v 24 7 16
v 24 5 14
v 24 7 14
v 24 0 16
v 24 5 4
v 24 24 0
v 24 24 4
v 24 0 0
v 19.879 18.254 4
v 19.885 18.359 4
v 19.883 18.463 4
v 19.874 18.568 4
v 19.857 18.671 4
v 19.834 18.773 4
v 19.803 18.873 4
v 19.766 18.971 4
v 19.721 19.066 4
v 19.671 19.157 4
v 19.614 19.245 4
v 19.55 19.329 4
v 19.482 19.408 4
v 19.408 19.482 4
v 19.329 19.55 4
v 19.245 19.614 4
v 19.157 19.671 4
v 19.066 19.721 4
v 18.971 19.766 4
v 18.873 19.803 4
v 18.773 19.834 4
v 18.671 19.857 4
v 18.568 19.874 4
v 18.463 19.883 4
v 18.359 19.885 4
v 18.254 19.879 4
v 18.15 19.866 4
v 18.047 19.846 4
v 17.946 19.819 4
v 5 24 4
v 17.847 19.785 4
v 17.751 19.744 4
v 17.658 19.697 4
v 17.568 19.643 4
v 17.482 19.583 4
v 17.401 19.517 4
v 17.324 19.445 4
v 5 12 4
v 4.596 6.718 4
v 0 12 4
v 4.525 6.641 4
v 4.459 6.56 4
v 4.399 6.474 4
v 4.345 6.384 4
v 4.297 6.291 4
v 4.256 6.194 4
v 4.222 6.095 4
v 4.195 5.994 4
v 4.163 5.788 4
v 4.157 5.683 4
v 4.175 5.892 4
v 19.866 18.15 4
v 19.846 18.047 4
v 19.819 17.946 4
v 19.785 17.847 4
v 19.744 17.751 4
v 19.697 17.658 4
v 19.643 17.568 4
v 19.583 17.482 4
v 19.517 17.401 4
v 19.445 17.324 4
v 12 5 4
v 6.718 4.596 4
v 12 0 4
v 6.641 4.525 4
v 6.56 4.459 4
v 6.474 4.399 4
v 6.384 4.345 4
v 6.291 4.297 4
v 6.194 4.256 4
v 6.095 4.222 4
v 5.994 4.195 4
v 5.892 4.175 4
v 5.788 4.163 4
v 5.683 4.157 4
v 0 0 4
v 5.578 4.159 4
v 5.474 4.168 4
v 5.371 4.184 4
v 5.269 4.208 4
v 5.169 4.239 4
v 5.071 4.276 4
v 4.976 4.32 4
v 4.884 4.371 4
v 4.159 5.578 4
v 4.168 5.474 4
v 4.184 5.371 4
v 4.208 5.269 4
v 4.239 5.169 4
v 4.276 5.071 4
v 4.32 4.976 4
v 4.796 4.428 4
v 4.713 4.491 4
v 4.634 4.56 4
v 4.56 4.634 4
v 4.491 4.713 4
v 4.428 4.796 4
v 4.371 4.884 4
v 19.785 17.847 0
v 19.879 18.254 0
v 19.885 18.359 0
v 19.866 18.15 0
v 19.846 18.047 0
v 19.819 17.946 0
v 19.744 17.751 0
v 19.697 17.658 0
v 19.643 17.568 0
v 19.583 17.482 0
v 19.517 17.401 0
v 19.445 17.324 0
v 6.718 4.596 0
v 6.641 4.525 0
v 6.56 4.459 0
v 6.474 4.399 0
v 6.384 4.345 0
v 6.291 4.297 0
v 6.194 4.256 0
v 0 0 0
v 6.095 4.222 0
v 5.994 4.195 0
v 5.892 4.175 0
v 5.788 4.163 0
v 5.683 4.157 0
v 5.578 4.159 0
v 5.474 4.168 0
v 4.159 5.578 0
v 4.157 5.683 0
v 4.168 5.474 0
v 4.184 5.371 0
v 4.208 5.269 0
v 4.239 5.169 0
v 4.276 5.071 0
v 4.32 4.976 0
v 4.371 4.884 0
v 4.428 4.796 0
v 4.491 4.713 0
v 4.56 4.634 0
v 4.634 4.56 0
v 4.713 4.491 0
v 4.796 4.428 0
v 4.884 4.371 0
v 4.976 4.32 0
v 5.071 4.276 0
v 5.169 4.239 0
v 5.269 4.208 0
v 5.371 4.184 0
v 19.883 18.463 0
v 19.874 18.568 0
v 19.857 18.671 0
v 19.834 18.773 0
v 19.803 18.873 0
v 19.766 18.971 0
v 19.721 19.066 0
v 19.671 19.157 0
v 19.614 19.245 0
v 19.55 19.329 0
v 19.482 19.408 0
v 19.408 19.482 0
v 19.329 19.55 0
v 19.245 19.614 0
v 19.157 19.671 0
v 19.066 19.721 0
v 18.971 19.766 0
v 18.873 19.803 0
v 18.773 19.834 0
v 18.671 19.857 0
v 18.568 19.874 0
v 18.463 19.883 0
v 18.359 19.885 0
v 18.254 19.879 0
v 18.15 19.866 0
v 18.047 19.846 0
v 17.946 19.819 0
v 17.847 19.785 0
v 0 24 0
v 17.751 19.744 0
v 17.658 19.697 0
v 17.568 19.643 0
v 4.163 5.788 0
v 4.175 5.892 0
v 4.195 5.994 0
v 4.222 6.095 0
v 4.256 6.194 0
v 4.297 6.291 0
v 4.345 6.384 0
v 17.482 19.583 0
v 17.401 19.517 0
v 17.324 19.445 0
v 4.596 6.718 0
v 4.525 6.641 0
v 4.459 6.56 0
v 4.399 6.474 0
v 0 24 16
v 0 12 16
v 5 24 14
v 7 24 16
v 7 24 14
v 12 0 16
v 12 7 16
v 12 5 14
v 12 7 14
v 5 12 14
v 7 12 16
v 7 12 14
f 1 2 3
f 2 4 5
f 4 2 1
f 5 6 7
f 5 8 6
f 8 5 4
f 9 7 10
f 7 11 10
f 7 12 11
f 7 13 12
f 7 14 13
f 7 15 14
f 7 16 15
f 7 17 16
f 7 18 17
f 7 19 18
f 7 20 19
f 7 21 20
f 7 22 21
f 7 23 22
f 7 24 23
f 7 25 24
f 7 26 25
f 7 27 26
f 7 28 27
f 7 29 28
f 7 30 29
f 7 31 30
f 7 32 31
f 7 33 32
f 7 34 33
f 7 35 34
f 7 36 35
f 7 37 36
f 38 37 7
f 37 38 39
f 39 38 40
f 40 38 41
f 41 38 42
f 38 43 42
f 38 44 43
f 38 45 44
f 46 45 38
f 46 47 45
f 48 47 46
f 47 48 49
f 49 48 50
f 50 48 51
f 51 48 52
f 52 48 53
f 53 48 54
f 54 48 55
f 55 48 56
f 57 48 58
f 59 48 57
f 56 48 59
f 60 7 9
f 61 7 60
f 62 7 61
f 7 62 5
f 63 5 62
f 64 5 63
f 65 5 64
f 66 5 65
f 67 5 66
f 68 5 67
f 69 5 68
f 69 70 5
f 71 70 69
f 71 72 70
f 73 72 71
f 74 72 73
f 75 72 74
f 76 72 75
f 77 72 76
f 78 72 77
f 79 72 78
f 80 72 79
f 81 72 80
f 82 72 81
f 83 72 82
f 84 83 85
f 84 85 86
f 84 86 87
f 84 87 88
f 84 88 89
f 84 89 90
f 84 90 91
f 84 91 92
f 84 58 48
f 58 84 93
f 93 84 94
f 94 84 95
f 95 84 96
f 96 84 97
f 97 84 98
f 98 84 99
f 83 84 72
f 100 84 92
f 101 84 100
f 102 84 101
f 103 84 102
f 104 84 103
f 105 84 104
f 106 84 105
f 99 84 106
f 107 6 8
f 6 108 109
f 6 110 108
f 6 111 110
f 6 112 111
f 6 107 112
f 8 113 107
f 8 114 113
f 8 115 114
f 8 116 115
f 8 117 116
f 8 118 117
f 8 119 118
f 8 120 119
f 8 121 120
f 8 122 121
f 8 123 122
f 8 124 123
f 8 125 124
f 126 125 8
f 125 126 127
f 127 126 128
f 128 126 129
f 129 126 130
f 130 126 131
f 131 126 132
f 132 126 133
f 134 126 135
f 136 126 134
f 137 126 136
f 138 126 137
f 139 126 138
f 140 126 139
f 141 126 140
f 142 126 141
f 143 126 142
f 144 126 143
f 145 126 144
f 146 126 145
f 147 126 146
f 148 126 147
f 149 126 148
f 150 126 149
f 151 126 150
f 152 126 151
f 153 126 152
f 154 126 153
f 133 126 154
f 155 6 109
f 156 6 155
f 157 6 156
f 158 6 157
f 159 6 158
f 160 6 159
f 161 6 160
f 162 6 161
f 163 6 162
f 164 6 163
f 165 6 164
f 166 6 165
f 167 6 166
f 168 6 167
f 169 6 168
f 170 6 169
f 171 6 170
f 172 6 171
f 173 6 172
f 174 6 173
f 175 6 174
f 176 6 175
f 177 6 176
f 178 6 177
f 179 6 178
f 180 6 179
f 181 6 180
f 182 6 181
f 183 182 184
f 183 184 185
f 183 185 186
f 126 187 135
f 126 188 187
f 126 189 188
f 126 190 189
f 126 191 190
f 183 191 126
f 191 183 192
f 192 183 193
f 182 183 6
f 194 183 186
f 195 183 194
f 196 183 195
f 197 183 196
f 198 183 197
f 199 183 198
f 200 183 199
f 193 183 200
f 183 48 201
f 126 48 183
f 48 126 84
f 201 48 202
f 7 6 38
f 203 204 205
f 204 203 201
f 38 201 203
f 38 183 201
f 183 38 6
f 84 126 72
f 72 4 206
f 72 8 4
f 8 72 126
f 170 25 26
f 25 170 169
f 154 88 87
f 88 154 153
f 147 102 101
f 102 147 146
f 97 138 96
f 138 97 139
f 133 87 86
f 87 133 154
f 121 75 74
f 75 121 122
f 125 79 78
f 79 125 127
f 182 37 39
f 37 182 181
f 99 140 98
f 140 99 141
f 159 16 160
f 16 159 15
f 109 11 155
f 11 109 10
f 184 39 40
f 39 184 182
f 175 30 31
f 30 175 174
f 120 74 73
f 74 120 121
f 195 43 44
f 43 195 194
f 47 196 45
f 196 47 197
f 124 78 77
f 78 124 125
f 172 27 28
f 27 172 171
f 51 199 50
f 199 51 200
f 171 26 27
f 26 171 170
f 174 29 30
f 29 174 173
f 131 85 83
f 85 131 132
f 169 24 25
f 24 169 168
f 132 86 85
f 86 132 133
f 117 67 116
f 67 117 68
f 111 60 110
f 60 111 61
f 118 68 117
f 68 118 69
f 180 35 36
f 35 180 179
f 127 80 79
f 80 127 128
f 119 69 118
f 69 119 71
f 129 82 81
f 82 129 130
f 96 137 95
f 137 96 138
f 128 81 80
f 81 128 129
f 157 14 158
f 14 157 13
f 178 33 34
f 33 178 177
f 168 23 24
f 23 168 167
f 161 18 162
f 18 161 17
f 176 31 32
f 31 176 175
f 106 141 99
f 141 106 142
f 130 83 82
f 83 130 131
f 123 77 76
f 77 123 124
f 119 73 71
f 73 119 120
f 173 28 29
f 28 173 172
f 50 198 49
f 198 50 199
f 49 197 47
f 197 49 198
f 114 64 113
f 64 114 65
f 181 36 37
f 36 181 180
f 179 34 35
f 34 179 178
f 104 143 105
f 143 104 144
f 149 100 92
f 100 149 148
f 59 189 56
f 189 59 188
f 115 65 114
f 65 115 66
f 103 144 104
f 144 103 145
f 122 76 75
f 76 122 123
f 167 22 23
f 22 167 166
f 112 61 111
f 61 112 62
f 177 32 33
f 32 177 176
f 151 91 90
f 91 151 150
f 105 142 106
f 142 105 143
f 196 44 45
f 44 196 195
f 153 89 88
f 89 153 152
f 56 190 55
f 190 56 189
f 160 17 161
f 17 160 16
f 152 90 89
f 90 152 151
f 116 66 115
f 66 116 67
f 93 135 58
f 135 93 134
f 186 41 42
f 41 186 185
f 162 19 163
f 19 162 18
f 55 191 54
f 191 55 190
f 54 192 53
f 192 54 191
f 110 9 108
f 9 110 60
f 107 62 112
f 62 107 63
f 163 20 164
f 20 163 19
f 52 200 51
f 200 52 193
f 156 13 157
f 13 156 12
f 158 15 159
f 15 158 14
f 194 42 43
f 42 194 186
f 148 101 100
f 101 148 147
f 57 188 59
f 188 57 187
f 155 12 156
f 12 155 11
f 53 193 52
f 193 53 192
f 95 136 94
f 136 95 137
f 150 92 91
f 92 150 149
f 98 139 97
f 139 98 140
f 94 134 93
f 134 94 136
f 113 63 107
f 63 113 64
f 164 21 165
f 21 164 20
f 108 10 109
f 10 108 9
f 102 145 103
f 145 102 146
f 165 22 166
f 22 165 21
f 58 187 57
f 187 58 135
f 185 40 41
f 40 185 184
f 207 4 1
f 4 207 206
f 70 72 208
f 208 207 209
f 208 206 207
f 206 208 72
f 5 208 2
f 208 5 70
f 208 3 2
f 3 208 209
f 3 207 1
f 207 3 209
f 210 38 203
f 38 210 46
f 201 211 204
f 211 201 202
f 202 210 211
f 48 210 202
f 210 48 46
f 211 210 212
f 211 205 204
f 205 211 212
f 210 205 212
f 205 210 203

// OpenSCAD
// openscad model by markwal
// modeled on thing:613685 by jherridge
// dimensions in mm

// (mm) a thicker base requires a longer screw
base_thickness=4;

// (mm) thickness of your build platform before the glass is added (both the heater and the aluminum)
heated_bed_thickness=10;

// (mm) thickness of the glass plate
glass_thickness=2;

// (mm) width of the bolt slot
bolt_diameter=3;

// overhang is the space on each side where the aluminum plate
// is bigger than the glass plate.  Round up because that 
// will just leave some air between the edge of the plate 
// and the clip.  Rounding down will leave play for the glass.

// (mm) the overhang pushes on the glass to hold it in place, the smaller the glass (in x and y) the more overhang you need
overhang=2;

union() {

difference() {
	// base
	cube([24,24,base_thickness]);

	// slot
	rotate([0,0,-45]) 
	translate([0,8,0]) hull() {
		translate([0,18,0])
			cylinder(h=base_thickness,d=bolt_diameter, $fn=90);
		cylinder(h=base_thickness,d=bolt_diameter,$fn=90);
	}
}

// we make the towers completely overlap the base and
// the overhang in order to avoid problems generating
// the mesh when rounding may have the faces not overlap
translate([12,0,0])
	cube([12,5,base_thickness+heated_bed_thickness+glass_thickness]);
translate([12,0,base_thickness+heated_bed_thickness])
	cube([12,5+overhang,glass_thickness]);

translate([0,12,0])
	cube([5,12,base_thickness+heated_bed_thickness+glass_thickness]);
translate([0,12,base_thickness+heated_bed_thickness])
	cube([5+overhang,12,glass_thickness]);
}
